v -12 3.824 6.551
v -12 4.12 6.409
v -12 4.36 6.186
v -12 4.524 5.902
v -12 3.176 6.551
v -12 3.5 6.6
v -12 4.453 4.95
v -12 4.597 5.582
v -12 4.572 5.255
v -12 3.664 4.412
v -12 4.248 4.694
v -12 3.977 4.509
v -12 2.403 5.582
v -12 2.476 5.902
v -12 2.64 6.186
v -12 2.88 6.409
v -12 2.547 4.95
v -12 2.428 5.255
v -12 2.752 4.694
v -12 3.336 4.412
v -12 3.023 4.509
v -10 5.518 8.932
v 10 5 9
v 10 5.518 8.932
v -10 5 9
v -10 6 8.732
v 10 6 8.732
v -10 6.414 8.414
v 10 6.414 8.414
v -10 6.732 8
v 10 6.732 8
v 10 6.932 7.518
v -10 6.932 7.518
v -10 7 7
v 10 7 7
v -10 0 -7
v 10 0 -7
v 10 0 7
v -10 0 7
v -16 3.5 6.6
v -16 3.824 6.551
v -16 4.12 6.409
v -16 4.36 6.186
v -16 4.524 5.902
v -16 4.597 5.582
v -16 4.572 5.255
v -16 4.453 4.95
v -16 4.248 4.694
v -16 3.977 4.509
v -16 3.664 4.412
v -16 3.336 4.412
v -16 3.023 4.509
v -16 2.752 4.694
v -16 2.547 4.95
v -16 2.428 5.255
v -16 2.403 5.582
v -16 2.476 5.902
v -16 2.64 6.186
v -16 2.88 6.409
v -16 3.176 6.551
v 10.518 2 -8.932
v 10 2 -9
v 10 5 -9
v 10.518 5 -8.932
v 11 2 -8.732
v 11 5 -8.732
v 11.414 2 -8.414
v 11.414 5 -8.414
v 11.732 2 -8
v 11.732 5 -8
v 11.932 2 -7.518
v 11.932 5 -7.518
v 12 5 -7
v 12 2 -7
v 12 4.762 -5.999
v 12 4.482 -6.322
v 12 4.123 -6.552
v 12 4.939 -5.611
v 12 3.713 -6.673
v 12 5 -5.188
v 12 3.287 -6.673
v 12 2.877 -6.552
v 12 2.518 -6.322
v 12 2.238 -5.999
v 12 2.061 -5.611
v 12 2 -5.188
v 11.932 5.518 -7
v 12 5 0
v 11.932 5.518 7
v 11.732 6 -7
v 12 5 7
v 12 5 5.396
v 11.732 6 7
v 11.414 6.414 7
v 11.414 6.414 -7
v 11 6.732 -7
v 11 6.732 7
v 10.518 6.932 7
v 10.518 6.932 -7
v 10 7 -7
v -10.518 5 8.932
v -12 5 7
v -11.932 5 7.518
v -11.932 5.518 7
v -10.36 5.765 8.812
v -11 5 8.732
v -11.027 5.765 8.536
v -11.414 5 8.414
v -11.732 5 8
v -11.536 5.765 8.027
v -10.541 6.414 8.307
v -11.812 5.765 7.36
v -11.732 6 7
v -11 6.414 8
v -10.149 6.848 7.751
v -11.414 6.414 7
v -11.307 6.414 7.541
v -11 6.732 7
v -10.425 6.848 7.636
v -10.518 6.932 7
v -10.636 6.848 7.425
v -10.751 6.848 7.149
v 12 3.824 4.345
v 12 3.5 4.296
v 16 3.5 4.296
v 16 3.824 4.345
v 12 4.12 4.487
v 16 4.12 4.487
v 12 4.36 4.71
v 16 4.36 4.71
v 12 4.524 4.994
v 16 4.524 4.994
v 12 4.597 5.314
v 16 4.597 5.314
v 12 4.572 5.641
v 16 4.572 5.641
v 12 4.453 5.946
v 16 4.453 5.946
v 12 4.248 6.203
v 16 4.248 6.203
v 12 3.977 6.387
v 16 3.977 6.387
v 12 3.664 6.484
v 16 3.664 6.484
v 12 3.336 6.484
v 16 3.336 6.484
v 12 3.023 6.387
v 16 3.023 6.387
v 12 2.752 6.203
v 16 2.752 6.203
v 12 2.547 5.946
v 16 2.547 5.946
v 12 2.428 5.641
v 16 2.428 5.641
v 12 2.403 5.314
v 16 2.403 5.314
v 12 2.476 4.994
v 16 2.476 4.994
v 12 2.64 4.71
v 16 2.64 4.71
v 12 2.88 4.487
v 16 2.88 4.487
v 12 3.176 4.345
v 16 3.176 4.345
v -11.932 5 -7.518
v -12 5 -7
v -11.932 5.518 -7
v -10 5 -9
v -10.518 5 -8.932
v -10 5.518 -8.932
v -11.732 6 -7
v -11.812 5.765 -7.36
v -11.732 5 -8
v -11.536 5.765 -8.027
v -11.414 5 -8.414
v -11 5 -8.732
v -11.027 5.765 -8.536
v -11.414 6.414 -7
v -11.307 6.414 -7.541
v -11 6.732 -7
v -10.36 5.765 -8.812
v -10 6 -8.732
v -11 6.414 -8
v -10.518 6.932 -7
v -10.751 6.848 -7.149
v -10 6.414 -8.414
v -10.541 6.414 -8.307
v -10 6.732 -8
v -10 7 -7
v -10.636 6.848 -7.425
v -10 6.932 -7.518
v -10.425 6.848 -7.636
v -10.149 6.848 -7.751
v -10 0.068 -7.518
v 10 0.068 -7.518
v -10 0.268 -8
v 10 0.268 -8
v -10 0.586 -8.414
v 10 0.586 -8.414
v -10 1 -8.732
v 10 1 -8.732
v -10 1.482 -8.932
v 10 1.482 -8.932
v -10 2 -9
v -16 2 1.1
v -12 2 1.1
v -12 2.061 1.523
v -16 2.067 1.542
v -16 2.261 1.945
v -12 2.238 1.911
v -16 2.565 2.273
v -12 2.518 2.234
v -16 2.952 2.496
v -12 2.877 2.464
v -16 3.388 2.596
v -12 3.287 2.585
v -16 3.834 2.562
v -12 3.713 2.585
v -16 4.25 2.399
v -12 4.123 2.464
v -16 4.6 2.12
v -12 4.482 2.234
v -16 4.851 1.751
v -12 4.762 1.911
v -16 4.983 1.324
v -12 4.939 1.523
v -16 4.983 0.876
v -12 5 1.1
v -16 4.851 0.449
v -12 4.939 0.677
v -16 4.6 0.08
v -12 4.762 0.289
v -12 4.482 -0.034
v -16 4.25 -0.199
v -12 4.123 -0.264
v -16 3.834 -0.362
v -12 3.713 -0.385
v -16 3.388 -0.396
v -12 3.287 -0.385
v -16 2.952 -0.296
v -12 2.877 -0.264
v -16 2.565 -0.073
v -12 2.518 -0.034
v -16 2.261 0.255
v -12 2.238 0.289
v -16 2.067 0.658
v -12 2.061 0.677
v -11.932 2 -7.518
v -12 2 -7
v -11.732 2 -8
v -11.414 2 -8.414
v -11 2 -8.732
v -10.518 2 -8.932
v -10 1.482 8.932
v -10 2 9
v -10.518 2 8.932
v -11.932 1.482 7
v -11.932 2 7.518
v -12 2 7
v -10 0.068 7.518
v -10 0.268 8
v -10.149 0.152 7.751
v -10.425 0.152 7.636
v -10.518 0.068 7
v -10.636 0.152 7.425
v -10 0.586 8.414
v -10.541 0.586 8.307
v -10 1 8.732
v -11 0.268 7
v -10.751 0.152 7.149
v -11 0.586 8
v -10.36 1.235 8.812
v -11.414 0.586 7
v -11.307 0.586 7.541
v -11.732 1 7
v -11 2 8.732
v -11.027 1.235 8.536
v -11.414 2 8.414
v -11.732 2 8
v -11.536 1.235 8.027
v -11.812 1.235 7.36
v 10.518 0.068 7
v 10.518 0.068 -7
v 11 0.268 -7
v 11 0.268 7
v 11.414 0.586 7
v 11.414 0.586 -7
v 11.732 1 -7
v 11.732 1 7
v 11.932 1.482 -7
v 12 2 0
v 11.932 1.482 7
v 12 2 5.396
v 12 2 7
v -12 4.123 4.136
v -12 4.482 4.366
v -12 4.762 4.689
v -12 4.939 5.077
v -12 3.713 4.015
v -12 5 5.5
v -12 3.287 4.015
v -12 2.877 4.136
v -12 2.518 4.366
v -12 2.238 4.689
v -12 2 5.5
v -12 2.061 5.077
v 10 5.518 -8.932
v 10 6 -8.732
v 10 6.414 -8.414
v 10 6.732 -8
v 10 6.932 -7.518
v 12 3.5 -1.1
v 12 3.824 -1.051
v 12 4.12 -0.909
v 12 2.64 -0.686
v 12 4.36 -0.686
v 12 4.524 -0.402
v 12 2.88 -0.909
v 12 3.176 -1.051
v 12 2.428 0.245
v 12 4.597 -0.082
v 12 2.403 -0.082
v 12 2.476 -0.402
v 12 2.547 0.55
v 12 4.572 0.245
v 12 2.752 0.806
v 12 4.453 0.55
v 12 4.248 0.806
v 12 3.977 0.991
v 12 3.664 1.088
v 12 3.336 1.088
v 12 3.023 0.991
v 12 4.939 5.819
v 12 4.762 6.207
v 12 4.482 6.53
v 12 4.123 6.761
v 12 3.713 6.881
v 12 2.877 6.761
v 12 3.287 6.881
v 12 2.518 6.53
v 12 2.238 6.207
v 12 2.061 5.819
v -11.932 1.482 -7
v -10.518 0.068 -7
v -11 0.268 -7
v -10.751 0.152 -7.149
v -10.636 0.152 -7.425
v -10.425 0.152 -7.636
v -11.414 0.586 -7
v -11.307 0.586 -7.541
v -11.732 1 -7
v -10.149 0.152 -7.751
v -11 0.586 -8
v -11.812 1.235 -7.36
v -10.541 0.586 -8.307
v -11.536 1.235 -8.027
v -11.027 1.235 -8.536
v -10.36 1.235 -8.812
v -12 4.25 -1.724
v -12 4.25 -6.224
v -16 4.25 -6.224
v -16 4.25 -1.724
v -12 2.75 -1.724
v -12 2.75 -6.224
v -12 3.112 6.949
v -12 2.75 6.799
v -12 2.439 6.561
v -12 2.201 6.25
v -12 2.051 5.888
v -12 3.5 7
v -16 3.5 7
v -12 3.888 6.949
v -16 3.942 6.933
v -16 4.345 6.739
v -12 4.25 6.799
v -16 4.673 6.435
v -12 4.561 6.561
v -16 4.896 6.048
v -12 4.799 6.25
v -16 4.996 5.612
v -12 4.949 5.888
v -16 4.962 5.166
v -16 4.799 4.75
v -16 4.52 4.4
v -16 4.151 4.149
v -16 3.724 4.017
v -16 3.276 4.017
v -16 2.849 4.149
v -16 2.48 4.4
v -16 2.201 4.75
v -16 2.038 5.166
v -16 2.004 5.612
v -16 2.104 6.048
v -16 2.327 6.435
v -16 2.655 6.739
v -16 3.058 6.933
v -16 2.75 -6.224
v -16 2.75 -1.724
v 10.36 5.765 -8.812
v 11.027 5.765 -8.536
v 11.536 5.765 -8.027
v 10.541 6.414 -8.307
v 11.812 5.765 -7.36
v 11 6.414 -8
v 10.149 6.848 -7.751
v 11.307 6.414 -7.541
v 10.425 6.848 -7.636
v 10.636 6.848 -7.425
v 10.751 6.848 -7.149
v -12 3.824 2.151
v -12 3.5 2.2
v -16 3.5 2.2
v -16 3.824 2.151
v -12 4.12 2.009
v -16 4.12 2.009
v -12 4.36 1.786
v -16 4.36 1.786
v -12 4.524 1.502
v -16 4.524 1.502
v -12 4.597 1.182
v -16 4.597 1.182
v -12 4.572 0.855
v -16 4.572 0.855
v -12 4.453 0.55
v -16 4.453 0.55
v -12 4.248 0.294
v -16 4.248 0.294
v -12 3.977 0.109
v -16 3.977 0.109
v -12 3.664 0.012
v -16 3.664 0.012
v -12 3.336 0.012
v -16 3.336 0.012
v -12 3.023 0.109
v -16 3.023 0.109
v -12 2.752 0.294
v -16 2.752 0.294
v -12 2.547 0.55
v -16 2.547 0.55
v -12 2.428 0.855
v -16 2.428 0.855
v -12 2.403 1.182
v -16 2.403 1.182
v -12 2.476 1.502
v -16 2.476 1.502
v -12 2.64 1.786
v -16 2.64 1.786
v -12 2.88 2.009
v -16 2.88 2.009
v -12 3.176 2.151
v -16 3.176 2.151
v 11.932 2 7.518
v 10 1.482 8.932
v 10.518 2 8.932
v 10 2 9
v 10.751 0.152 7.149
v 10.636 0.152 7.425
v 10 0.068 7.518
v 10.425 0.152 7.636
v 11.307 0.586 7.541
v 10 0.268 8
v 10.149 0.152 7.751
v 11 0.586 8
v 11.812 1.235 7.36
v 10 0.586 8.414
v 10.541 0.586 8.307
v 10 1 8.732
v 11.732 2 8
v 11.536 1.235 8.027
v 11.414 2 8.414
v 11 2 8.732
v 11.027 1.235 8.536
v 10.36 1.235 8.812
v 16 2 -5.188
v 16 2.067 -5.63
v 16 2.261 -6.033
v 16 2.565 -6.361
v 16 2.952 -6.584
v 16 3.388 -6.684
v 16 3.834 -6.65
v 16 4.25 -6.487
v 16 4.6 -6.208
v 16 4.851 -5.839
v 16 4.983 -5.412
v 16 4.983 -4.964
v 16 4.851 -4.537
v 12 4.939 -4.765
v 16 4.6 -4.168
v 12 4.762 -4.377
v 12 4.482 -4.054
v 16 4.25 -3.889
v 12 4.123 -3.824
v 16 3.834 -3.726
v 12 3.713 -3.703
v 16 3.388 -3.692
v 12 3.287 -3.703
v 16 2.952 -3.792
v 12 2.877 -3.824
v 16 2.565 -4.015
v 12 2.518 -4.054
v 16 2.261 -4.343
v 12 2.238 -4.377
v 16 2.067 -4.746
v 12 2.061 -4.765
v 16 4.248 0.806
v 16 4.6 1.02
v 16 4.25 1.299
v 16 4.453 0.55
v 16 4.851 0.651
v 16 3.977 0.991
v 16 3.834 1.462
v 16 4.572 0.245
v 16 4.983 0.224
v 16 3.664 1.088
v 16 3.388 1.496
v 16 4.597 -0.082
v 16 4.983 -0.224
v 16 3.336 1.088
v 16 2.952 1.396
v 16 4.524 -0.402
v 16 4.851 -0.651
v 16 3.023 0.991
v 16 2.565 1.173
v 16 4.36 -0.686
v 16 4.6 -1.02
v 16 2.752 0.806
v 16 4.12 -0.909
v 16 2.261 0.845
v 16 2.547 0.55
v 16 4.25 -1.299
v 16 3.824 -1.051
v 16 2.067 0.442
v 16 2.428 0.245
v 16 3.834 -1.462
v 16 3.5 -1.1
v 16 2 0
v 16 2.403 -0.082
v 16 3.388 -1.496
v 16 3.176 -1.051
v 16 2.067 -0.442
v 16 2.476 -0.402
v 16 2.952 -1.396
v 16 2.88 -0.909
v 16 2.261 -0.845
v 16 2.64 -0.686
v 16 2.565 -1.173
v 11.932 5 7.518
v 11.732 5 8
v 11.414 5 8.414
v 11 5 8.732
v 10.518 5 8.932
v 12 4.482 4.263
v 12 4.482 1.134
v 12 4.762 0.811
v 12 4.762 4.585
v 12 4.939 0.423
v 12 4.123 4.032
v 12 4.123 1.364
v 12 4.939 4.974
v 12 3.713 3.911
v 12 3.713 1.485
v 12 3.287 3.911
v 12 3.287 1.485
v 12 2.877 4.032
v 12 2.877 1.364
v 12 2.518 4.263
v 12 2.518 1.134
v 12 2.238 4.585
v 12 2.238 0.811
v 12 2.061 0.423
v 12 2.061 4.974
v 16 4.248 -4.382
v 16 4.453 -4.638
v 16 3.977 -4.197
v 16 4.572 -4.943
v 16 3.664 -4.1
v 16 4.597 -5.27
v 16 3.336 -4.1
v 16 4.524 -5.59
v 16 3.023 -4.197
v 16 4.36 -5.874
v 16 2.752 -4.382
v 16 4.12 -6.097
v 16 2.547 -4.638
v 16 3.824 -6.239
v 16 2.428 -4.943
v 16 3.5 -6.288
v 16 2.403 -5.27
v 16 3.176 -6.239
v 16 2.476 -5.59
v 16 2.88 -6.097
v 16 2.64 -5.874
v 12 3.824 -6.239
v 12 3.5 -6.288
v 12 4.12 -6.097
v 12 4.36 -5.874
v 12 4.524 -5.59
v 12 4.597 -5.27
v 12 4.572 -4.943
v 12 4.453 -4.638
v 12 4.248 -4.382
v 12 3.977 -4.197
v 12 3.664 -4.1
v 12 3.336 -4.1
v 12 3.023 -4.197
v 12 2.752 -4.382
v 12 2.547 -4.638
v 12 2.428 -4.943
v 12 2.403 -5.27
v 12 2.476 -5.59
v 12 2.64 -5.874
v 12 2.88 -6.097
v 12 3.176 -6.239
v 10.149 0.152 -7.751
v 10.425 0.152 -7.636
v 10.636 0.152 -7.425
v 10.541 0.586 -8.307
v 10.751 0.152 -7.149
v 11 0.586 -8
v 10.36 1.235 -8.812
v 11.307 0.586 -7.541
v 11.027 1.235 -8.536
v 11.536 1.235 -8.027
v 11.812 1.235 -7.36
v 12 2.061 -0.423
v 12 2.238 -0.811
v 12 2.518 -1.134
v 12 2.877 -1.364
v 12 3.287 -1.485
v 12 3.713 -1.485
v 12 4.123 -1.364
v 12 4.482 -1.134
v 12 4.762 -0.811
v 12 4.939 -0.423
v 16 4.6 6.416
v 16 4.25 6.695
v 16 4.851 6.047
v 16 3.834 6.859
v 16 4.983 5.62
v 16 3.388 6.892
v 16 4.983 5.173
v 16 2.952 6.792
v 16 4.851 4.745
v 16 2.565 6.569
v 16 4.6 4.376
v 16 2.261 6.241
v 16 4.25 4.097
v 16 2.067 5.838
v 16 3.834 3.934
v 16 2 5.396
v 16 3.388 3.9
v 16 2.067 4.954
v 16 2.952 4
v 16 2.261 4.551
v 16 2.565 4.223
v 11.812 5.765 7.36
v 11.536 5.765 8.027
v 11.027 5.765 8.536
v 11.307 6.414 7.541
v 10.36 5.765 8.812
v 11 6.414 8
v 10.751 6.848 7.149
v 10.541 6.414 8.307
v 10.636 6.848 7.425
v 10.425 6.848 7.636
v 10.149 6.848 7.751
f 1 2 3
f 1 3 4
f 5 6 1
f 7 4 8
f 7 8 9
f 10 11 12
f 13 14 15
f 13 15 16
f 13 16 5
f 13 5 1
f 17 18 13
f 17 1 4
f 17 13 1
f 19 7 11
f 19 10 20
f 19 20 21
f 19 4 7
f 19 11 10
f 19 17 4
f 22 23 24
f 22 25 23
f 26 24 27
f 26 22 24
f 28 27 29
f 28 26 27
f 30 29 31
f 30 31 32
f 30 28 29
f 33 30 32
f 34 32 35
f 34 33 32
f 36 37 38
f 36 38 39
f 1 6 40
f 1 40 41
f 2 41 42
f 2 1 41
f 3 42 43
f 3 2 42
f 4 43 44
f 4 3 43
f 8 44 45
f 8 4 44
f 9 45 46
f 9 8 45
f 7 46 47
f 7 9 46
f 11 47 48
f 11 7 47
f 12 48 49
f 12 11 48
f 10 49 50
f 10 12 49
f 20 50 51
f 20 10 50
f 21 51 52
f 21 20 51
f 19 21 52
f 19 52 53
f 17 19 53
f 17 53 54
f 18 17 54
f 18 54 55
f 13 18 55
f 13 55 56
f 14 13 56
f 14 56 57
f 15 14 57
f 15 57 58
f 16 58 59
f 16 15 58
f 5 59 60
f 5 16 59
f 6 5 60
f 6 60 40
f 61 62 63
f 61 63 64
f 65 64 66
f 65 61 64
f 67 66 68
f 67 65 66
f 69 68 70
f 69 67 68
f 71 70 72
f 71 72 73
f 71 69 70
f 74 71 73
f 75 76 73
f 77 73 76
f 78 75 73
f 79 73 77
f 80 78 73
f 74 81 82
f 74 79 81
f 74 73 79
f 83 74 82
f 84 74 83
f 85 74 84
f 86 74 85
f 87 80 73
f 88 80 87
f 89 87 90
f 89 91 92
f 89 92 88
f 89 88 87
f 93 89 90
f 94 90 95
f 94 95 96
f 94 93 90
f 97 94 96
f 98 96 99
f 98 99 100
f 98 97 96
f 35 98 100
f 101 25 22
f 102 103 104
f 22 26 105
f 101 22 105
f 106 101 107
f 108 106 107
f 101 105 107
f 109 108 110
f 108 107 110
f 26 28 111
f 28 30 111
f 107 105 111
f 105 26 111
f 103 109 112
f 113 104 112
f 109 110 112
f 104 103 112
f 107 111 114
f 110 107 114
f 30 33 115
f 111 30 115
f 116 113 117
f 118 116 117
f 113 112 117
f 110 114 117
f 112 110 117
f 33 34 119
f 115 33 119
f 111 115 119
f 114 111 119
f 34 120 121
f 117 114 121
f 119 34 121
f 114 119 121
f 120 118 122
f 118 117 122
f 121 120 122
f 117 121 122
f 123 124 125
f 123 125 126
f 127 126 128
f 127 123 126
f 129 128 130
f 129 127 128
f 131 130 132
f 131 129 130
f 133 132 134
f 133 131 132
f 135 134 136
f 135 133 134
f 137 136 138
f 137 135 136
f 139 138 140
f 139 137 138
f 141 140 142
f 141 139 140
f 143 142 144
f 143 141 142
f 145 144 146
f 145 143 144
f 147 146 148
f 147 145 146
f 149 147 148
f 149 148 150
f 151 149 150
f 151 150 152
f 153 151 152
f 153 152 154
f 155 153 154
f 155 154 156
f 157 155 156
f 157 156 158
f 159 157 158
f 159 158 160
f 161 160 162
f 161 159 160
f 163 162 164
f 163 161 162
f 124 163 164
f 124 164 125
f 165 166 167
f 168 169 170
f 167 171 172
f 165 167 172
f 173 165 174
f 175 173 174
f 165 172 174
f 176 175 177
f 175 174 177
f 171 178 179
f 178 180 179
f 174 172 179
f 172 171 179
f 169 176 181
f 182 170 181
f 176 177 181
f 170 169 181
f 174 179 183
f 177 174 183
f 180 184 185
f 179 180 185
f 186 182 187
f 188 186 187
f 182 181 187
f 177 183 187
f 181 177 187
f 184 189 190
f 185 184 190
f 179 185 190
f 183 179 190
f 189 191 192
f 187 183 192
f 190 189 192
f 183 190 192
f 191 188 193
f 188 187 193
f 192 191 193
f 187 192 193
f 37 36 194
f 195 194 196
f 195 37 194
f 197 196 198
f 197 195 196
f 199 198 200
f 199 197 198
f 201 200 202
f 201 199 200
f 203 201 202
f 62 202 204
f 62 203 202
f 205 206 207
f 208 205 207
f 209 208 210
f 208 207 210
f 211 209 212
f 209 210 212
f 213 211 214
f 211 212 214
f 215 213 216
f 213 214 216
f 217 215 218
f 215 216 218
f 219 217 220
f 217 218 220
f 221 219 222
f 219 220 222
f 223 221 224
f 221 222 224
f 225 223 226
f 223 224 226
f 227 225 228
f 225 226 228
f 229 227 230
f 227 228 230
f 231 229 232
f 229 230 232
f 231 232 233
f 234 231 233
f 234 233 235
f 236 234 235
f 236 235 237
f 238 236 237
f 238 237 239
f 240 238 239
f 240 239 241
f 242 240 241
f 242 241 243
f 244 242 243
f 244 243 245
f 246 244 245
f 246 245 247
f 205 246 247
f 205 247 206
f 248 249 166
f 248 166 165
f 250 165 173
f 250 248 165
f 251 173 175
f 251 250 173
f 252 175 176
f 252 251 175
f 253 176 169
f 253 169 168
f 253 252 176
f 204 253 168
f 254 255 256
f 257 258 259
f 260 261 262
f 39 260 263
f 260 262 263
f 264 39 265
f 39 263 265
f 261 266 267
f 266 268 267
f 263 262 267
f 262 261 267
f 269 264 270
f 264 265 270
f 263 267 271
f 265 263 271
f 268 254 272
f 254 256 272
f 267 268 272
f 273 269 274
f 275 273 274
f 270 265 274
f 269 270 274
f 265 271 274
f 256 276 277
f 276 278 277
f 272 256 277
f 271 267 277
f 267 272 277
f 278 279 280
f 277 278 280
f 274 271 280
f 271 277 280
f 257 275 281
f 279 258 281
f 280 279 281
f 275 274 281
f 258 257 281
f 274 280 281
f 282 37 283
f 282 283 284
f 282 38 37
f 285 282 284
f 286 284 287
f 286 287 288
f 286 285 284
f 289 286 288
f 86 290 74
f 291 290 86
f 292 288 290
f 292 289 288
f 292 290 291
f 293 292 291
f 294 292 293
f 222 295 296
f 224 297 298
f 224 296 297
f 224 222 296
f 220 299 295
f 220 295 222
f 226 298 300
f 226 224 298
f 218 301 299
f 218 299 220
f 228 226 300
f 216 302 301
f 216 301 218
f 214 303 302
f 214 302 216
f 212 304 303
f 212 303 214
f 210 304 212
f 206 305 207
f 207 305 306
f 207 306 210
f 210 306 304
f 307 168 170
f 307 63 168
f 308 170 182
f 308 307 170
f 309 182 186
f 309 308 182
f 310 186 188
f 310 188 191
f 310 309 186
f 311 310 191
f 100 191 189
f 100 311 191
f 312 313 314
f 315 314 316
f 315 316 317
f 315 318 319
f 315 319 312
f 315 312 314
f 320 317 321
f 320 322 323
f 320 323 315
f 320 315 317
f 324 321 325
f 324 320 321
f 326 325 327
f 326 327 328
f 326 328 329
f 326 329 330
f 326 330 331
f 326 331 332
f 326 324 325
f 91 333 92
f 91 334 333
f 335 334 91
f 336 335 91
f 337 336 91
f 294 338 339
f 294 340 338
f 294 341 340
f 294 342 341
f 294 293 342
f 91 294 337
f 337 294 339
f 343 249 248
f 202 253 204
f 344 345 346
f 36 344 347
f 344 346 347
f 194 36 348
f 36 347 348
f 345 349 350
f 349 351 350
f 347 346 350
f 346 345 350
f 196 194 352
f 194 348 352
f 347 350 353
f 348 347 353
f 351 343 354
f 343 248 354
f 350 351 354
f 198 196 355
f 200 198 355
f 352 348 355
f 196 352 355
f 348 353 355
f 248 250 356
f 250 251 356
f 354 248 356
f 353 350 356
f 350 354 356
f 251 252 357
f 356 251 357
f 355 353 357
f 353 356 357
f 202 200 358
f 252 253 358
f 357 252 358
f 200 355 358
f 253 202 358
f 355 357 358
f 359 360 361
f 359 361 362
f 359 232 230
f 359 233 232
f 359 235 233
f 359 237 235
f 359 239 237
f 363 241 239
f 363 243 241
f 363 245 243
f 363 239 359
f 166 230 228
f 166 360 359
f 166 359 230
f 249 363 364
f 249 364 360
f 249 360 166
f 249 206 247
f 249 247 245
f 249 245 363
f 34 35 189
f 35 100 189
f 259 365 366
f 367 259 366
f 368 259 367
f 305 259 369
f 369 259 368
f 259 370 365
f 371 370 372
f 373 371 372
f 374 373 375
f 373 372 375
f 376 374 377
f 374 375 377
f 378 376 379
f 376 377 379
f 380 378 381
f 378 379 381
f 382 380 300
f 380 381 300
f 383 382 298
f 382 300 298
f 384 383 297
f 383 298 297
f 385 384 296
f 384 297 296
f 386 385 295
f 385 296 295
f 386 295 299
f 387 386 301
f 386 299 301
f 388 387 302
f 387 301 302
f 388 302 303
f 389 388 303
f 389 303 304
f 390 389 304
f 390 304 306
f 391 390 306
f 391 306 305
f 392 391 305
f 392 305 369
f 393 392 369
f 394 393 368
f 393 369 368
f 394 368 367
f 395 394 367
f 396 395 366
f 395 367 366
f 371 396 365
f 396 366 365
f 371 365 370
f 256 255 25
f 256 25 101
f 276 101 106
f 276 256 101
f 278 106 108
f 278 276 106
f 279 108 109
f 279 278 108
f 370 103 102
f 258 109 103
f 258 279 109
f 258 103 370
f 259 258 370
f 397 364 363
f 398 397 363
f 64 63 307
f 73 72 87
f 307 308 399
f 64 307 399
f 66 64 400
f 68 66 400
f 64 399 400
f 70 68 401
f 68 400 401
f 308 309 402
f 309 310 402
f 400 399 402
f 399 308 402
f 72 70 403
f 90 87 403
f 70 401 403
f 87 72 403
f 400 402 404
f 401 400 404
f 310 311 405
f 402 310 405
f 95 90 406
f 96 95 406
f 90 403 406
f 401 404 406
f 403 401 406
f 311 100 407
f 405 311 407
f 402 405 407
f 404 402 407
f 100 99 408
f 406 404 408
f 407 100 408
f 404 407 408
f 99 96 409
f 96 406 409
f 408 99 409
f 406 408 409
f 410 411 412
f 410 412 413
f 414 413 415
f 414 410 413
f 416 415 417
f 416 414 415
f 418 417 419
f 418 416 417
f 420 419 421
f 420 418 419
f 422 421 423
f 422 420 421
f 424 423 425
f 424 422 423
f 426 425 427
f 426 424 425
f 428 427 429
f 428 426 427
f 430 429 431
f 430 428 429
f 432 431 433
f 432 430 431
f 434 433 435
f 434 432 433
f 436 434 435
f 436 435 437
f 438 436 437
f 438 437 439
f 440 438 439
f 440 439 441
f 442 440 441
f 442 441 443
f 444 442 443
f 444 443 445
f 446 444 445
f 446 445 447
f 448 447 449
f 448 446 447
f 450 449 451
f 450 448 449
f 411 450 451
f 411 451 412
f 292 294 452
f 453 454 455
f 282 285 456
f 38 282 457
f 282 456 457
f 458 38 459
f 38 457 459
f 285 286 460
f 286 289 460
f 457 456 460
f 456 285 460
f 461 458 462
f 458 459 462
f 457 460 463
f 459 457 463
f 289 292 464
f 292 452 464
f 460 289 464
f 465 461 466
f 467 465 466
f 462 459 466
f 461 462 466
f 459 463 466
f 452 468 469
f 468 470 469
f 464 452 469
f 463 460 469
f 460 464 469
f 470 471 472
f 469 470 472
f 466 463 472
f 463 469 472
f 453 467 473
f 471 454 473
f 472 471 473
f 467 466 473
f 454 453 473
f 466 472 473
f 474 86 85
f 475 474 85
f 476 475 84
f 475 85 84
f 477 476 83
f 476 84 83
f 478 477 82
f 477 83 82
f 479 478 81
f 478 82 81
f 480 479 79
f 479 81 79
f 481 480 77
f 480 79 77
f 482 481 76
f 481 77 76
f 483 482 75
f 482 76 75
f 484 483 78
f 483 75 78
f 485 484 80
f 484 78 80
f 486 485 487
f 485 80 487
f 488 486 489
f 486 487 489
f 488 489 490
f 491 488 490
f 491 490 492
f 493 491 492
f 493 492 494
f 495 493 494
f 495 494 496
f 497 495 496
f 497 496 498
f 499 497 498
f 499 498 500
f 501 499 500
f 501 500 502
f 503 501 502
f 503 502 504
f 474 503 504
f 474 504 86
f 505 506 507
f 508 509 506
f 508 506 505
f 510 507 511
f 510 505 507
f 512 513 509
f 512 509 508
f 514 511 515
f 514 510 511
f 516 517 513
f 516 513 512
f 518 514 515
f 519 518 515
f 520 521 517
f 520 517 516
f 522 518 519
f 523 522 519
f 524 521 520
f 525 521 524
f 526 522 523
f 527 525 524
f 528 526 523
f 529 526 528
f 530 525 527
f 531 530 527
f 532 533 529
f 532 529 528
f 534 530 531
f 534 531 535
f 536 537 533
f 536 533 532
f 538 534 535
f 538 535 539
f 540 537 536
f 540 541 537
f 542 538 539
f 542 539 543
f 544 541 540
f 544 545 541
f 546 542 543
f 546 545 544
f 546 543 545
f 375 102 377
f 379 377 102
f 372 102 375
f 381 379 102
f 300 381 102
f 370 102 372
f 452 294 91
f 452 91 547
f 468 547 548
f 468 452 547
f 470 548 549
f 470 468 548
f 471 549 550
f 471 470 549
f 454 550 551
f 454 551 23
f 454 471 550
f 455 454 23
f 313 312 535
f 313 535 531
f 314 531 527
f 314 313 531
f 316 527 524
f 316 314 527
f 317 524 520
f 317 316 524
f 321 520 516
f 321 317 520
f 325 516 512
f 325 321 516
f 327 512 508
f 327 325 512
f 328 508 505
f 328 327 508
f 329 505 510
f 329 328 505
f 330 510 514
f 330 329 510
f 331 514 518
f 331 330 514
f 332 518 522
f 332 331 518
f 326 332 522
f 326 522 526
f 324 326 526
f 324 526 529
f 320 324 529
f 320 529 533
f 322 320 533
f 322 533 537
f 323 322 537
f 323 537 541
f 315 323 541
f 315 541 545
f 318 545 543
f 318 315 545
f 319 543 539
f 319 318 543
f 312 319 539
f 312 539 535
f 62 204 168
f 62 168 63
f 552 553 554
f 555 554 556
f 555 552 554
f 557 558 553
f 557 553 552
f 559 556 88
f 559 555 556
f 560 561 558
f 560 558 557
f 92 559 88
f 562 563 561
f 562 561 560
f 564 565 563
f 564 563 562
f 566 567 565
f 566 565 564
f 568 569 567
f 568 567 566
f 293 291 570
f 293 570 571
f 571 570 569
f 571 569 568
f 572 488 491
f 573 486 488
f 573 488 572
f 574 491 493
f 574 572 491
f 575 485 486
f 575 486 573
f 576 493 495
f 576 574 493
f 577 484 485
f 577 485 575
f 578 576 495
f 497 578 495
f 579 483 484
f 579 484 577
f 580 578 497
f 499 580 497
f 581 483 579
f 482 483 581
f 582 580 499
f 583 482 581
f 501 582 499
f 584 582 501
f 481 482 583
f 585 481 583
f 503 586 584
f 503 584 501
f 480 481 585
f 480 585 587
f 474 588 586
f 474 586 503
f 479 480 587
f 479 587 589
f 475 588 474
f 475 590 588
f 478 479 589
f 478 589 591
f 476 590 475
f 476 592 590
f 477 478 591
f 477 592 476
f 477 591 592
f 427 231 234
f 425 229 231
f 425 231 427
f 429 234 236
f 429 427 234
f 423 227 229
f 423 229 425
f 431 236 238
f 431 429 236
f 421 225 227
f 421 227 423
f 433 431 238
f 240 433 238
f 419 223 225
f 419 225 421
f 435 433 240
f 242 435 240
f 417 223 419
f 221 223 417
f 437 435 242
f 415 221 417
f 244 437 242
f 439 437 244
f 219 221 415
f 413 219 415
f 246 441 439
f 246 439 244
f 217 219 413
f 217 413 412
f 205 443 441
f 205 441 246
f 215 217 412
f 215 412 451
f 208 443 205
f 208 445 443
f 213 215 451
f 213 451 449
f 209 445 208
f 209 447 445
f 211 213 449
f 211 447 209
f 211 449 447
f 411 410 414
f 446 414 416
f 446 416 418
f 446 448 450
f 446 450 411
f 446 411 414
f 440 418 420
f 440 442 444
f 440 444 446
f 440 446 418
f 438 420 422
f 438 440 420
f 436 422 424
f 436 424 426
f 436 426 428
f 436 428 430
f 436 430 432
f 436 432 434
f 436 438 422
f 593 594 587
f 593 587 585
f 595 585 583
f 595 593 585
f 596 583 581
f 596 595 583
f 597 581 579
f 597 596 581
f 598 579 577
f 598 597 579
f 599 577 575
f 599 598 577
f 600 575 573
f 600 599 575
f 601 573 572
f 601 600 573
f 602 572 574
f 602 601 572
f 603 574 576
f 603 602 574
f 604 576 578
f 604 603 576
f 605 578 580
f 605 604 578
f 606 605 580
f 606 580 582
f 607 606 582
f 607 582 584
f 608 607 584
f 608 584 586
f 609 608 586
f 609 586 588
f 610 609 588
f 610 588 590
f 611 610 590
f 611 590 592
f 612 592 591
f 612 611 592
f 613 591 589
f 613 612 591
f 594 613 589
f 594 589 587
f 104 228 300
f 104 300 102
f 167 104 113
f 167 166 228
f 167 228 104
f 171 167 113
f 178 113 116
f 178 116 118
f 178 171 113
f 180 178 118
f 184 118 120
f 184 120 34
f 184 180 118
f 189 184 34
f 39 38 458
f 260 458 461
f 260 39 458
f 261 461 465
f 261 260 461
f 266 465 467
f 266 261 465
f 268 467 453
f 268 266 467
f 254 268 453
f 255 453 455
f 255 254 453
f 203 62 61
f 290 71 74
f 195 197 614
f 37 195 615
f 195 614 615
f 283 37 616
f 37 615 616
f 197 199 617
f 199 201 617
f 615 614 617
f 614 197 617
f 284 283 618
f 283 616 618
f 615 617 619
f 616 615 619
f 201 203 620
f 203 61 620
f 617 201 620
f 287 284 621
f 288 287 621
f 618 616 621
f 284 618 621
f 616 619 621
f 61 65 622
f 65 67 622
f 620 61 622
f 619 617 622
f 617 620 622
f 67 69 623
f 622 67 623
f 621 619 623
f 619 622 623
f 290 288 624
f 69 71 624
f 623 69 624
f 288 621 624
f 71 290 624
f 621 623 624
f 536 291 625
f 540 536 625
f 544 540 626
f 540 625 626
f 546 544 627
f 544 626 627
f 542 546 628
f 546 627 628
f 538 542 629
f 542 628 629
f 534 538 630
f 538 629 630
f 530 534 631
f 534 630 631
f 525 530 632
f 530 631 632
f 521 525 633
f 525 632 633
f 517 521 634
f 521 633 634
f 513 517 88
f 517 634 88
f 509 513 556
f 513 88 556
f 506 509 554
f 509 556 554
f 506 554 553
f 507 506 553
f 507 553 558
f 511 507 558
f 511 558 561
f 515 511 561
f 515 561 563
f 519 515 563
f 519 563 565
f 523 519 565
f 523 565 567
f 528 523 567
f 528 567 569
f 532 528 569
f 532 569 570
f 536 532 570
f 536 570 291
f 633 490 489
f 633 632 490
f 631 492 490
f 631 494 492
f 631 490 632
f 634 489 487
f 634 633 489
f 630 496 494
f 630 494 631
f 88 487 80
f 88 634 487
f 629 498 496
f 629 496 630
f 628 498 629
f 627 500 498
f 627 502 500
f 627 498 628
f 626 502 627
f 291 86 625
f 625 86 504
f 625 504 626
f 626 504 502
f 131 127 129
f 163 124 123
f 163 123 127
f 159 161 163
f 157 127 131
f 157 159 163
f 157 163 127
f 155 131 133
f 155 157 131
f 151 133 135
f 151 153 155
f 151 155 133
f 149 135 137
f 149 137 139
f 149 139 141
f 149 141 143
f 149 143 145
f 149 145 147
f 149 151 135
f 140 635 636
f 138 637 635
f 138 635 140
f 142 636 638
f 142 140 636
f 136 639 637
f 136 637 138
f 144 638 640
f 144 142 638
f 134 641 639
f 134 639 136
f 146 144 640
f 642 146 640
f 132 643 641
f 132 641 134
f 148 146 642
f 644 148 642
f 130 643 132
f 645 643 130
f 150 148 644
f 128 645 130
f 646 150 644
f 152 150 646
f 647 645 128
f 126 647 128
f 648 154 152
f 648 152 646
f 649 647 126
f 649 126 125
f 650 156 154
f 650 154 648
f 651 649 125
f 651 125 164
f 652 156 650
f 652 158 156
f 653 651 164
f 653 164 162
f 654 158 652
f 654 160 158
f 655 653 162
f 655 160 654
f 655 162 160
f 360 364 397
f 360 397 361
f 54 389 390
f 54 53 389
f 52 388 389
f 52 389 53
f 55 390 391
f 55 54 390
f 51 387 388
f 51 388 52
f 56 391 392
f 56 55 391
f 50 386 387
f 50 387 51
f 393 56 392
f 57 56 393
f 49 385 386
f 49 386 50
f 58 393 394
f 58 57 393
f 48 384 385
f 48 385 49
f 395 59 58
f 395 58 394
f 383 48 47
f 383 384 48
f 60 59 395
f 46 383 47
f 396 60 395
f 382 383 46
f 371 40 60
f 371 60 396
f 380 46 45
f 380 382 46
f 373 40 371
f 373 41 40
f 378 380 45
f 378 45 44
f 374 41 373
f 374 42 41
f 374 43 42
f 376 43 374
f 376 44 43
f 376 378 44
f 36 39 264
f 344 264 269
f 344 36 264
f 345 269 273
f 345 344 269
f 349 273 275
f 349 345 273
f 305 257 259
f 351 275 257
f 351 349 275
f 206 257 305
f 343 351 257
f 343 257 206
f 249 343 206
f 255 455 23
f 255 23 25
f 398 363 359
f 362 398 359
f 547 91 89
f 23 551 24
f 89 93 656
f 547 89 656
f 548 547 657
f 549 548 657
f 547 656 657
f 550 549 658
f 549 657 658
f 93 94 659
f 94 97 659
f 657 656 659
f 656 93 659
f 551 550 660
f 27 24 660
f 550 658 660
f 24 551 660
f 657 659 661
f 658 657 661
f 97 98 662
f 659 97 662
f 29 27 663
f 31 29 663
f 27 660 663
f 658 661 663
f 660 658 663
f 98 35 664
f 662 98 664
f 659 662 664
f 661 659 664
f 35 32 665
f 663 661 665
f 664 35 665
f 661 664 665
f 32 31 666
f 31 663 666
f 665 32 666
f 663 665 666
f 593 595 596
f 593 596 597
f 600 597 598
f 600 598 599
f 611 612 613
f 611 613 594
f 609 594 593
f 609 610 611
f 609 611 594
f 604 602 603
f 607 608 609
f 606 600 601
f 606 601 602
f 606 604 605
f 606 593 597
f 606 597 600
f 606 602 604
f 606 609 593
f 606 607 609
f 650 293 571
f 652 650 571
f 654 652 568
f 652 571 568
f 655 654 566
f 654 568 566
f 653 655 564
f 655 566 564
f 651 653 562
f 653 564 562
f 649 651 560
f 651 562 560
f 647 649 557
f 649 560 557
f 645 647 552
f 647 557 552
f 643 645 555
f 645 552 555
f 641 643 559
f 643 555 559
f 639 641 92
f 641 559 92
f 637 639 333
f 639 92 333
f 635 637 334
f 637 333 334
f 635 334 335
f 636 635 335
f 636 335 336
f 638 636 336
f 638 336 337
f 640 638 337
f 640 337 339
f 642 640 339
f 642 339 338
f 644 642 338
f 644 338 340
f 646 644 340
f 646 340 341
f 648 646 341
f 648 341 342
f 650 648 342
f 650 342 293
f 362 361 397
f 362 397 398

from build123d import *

# Parameters (mm, degrees)
BOSS_EXTRUDE1_DEPTH = 7
FILLET1_R           = 2
FILLET2_R           = 2
SKETCH2_R           = 1.5
SKETCH2_R_2         = 1.1
BOSS_EXTRUDE2_DEPTH = 4
SKETCH3_R           = 1.5
SKETCH3_R_2         = 1.1
SKETCH3_W           = 4.5
SKETCH3_H           = 1.5
BOSS_EXTRUDE3_DEPTH = 4


with BuildPart() as part:
    # Sketch1 → Boss-Extrude1 (new body)
    with BuildSketch(Plane(origin=(0, 0, 0), x_dir=(1, 0, 0), z_dir=(0, 1, 0))):
        with BuildLine():
            Line((10, -9), (-10, -9))
            ThreePointArc((-10, -9), (-11.414213562, -8.414213562), (-12, -7))
            Line((-12, -7), (-12, 7))
            ThreePointArc((-12, 7), (-11.414213562, 8.414213562), (-10, 9))
            Line((-10, 9), (10, 9))
            ThreePointArc((10, 9), (11.414213562, 8.414213562), (12, 7))
            Line((12, 7), (12, -7))
            ThreePointArc((12, -7), (11.414213562, -8.414213562), (10, -9))
        make_face()
    extrude(amount=BOSS_EXTRUDE1_DEPTH)

    # Fillet1
    fillet1_edges = [part.edges().sort_by_distance(p)[0] for p in [
        (11.414213562, 7, 8.414213562),
        (12, 7, 0),
        (11.414213562, 7, -8.414213562),
        (0, 7, -9),
        (-11.414213562, 7, -8.414213562),
        (-12, 7, 0),
        (-11.414213562, 7, 8.414213562),
        (0, 7, 9),
    ]]
    fillet(fillet1_edges, radius=FILLET1_R)

    # Fillet2
    fillet2_edges = [part.edges().sort_by_distance(p)[0] for p in [
        (12, 0, 0),
        (11.414213562, 0, 8.414213562),
        (0, 0, 9),
        (-11.414213562, 0, 8.414213562),
        (-12, 0, 0),
        (-11.414213562, 0, -8.414213562),
        (0, 0, -9),
        (11.414213562, 0, -8.414213562),
    ]]
    fillet(fillet2_edges, radius=FILLET2_R)

    # Sketch2 → Boss-Extrude2 (add)
    # profile 1 of 3: a face of its own
    with BuildSketch(Plane(origin=(12, 0, 0), x_dir=(0, 0, -1), z_dir=(1, 0, 0))):
        with Locations(Location((0, 3.5, 0), (0, 0, 270))):
            Circle(SKETCH2_R)
        with Locations((0, 3.5)):
            Circle(SKETCH2_R_2, mode=Mode.SUBTRACT)
    # profile 2 of 3: a face of its own
    with BuildSketch(Plane(origin=(12, 0, 0), x_dir=(0, 0, -1), z_dir=(1, 0, 0))):
        with Locations(Location((5.1879565, 3.5, 0), (0, 0, 270))):
            Circle(SKETCH2_R)
        with Locations((5.1879565, 3.5)):
            Circle(SKETCH2_R_2, mode=Mode.SUBTRACT)
    # profile 3 of 3: a face of its own
    with BuildSketch(Plane(origin=(12, 0, 0), x_dir=(0, 0, -1), z_dir=(1, 0, 0))):
        with Locations(Location((-5.396168524, 3.5, 0), (0, 0, 270))):
            Circle(SKETCH2_R)
        with Locations((-5.396168524, 3.5)):
            Circle(SKETCH2_R_2, mode=Mode.SUBTRACT)
    extrude(amount=BOSS_EXTRUDE2_DEPTH)

    # Sketch3 → Boss-Extrude3 (add)
    # profile 1 of 3: a face of its own
    with BuildSketch(Plane.ZY.offset(12)):
        with Locations((5.5, 3.5)):
            Circle(SKETCH3_R)
        with Locations((5.5, 3.5)):
            Circle(SKETCH3_R_2, mode=Mode.SUBTRACT)
    # profile 2 of 3: a face of its own
    with BuildSketch(Plane.ZY.offset(12)):
        with Locations(Location((1.1, 3.5, 0), (0, 0, 270))):
            Circle(SKETCH3_R)
        with Locations((1.1, 3.5)):
            Circle(SKETCH3_R_2, mode=Mode.SUBTRACT)
    # profile 3 of 3: a face of its own
    with BuildSketch(Plane.ZY.offset(12)):
        with Locations((-3.974486265, 3.5)):
            Rectangle(SKETCH3_W, SKETCH3_H)
    extrude(amount=BOSS_EXTRUDE3_DEPTH)


solid = part.part
